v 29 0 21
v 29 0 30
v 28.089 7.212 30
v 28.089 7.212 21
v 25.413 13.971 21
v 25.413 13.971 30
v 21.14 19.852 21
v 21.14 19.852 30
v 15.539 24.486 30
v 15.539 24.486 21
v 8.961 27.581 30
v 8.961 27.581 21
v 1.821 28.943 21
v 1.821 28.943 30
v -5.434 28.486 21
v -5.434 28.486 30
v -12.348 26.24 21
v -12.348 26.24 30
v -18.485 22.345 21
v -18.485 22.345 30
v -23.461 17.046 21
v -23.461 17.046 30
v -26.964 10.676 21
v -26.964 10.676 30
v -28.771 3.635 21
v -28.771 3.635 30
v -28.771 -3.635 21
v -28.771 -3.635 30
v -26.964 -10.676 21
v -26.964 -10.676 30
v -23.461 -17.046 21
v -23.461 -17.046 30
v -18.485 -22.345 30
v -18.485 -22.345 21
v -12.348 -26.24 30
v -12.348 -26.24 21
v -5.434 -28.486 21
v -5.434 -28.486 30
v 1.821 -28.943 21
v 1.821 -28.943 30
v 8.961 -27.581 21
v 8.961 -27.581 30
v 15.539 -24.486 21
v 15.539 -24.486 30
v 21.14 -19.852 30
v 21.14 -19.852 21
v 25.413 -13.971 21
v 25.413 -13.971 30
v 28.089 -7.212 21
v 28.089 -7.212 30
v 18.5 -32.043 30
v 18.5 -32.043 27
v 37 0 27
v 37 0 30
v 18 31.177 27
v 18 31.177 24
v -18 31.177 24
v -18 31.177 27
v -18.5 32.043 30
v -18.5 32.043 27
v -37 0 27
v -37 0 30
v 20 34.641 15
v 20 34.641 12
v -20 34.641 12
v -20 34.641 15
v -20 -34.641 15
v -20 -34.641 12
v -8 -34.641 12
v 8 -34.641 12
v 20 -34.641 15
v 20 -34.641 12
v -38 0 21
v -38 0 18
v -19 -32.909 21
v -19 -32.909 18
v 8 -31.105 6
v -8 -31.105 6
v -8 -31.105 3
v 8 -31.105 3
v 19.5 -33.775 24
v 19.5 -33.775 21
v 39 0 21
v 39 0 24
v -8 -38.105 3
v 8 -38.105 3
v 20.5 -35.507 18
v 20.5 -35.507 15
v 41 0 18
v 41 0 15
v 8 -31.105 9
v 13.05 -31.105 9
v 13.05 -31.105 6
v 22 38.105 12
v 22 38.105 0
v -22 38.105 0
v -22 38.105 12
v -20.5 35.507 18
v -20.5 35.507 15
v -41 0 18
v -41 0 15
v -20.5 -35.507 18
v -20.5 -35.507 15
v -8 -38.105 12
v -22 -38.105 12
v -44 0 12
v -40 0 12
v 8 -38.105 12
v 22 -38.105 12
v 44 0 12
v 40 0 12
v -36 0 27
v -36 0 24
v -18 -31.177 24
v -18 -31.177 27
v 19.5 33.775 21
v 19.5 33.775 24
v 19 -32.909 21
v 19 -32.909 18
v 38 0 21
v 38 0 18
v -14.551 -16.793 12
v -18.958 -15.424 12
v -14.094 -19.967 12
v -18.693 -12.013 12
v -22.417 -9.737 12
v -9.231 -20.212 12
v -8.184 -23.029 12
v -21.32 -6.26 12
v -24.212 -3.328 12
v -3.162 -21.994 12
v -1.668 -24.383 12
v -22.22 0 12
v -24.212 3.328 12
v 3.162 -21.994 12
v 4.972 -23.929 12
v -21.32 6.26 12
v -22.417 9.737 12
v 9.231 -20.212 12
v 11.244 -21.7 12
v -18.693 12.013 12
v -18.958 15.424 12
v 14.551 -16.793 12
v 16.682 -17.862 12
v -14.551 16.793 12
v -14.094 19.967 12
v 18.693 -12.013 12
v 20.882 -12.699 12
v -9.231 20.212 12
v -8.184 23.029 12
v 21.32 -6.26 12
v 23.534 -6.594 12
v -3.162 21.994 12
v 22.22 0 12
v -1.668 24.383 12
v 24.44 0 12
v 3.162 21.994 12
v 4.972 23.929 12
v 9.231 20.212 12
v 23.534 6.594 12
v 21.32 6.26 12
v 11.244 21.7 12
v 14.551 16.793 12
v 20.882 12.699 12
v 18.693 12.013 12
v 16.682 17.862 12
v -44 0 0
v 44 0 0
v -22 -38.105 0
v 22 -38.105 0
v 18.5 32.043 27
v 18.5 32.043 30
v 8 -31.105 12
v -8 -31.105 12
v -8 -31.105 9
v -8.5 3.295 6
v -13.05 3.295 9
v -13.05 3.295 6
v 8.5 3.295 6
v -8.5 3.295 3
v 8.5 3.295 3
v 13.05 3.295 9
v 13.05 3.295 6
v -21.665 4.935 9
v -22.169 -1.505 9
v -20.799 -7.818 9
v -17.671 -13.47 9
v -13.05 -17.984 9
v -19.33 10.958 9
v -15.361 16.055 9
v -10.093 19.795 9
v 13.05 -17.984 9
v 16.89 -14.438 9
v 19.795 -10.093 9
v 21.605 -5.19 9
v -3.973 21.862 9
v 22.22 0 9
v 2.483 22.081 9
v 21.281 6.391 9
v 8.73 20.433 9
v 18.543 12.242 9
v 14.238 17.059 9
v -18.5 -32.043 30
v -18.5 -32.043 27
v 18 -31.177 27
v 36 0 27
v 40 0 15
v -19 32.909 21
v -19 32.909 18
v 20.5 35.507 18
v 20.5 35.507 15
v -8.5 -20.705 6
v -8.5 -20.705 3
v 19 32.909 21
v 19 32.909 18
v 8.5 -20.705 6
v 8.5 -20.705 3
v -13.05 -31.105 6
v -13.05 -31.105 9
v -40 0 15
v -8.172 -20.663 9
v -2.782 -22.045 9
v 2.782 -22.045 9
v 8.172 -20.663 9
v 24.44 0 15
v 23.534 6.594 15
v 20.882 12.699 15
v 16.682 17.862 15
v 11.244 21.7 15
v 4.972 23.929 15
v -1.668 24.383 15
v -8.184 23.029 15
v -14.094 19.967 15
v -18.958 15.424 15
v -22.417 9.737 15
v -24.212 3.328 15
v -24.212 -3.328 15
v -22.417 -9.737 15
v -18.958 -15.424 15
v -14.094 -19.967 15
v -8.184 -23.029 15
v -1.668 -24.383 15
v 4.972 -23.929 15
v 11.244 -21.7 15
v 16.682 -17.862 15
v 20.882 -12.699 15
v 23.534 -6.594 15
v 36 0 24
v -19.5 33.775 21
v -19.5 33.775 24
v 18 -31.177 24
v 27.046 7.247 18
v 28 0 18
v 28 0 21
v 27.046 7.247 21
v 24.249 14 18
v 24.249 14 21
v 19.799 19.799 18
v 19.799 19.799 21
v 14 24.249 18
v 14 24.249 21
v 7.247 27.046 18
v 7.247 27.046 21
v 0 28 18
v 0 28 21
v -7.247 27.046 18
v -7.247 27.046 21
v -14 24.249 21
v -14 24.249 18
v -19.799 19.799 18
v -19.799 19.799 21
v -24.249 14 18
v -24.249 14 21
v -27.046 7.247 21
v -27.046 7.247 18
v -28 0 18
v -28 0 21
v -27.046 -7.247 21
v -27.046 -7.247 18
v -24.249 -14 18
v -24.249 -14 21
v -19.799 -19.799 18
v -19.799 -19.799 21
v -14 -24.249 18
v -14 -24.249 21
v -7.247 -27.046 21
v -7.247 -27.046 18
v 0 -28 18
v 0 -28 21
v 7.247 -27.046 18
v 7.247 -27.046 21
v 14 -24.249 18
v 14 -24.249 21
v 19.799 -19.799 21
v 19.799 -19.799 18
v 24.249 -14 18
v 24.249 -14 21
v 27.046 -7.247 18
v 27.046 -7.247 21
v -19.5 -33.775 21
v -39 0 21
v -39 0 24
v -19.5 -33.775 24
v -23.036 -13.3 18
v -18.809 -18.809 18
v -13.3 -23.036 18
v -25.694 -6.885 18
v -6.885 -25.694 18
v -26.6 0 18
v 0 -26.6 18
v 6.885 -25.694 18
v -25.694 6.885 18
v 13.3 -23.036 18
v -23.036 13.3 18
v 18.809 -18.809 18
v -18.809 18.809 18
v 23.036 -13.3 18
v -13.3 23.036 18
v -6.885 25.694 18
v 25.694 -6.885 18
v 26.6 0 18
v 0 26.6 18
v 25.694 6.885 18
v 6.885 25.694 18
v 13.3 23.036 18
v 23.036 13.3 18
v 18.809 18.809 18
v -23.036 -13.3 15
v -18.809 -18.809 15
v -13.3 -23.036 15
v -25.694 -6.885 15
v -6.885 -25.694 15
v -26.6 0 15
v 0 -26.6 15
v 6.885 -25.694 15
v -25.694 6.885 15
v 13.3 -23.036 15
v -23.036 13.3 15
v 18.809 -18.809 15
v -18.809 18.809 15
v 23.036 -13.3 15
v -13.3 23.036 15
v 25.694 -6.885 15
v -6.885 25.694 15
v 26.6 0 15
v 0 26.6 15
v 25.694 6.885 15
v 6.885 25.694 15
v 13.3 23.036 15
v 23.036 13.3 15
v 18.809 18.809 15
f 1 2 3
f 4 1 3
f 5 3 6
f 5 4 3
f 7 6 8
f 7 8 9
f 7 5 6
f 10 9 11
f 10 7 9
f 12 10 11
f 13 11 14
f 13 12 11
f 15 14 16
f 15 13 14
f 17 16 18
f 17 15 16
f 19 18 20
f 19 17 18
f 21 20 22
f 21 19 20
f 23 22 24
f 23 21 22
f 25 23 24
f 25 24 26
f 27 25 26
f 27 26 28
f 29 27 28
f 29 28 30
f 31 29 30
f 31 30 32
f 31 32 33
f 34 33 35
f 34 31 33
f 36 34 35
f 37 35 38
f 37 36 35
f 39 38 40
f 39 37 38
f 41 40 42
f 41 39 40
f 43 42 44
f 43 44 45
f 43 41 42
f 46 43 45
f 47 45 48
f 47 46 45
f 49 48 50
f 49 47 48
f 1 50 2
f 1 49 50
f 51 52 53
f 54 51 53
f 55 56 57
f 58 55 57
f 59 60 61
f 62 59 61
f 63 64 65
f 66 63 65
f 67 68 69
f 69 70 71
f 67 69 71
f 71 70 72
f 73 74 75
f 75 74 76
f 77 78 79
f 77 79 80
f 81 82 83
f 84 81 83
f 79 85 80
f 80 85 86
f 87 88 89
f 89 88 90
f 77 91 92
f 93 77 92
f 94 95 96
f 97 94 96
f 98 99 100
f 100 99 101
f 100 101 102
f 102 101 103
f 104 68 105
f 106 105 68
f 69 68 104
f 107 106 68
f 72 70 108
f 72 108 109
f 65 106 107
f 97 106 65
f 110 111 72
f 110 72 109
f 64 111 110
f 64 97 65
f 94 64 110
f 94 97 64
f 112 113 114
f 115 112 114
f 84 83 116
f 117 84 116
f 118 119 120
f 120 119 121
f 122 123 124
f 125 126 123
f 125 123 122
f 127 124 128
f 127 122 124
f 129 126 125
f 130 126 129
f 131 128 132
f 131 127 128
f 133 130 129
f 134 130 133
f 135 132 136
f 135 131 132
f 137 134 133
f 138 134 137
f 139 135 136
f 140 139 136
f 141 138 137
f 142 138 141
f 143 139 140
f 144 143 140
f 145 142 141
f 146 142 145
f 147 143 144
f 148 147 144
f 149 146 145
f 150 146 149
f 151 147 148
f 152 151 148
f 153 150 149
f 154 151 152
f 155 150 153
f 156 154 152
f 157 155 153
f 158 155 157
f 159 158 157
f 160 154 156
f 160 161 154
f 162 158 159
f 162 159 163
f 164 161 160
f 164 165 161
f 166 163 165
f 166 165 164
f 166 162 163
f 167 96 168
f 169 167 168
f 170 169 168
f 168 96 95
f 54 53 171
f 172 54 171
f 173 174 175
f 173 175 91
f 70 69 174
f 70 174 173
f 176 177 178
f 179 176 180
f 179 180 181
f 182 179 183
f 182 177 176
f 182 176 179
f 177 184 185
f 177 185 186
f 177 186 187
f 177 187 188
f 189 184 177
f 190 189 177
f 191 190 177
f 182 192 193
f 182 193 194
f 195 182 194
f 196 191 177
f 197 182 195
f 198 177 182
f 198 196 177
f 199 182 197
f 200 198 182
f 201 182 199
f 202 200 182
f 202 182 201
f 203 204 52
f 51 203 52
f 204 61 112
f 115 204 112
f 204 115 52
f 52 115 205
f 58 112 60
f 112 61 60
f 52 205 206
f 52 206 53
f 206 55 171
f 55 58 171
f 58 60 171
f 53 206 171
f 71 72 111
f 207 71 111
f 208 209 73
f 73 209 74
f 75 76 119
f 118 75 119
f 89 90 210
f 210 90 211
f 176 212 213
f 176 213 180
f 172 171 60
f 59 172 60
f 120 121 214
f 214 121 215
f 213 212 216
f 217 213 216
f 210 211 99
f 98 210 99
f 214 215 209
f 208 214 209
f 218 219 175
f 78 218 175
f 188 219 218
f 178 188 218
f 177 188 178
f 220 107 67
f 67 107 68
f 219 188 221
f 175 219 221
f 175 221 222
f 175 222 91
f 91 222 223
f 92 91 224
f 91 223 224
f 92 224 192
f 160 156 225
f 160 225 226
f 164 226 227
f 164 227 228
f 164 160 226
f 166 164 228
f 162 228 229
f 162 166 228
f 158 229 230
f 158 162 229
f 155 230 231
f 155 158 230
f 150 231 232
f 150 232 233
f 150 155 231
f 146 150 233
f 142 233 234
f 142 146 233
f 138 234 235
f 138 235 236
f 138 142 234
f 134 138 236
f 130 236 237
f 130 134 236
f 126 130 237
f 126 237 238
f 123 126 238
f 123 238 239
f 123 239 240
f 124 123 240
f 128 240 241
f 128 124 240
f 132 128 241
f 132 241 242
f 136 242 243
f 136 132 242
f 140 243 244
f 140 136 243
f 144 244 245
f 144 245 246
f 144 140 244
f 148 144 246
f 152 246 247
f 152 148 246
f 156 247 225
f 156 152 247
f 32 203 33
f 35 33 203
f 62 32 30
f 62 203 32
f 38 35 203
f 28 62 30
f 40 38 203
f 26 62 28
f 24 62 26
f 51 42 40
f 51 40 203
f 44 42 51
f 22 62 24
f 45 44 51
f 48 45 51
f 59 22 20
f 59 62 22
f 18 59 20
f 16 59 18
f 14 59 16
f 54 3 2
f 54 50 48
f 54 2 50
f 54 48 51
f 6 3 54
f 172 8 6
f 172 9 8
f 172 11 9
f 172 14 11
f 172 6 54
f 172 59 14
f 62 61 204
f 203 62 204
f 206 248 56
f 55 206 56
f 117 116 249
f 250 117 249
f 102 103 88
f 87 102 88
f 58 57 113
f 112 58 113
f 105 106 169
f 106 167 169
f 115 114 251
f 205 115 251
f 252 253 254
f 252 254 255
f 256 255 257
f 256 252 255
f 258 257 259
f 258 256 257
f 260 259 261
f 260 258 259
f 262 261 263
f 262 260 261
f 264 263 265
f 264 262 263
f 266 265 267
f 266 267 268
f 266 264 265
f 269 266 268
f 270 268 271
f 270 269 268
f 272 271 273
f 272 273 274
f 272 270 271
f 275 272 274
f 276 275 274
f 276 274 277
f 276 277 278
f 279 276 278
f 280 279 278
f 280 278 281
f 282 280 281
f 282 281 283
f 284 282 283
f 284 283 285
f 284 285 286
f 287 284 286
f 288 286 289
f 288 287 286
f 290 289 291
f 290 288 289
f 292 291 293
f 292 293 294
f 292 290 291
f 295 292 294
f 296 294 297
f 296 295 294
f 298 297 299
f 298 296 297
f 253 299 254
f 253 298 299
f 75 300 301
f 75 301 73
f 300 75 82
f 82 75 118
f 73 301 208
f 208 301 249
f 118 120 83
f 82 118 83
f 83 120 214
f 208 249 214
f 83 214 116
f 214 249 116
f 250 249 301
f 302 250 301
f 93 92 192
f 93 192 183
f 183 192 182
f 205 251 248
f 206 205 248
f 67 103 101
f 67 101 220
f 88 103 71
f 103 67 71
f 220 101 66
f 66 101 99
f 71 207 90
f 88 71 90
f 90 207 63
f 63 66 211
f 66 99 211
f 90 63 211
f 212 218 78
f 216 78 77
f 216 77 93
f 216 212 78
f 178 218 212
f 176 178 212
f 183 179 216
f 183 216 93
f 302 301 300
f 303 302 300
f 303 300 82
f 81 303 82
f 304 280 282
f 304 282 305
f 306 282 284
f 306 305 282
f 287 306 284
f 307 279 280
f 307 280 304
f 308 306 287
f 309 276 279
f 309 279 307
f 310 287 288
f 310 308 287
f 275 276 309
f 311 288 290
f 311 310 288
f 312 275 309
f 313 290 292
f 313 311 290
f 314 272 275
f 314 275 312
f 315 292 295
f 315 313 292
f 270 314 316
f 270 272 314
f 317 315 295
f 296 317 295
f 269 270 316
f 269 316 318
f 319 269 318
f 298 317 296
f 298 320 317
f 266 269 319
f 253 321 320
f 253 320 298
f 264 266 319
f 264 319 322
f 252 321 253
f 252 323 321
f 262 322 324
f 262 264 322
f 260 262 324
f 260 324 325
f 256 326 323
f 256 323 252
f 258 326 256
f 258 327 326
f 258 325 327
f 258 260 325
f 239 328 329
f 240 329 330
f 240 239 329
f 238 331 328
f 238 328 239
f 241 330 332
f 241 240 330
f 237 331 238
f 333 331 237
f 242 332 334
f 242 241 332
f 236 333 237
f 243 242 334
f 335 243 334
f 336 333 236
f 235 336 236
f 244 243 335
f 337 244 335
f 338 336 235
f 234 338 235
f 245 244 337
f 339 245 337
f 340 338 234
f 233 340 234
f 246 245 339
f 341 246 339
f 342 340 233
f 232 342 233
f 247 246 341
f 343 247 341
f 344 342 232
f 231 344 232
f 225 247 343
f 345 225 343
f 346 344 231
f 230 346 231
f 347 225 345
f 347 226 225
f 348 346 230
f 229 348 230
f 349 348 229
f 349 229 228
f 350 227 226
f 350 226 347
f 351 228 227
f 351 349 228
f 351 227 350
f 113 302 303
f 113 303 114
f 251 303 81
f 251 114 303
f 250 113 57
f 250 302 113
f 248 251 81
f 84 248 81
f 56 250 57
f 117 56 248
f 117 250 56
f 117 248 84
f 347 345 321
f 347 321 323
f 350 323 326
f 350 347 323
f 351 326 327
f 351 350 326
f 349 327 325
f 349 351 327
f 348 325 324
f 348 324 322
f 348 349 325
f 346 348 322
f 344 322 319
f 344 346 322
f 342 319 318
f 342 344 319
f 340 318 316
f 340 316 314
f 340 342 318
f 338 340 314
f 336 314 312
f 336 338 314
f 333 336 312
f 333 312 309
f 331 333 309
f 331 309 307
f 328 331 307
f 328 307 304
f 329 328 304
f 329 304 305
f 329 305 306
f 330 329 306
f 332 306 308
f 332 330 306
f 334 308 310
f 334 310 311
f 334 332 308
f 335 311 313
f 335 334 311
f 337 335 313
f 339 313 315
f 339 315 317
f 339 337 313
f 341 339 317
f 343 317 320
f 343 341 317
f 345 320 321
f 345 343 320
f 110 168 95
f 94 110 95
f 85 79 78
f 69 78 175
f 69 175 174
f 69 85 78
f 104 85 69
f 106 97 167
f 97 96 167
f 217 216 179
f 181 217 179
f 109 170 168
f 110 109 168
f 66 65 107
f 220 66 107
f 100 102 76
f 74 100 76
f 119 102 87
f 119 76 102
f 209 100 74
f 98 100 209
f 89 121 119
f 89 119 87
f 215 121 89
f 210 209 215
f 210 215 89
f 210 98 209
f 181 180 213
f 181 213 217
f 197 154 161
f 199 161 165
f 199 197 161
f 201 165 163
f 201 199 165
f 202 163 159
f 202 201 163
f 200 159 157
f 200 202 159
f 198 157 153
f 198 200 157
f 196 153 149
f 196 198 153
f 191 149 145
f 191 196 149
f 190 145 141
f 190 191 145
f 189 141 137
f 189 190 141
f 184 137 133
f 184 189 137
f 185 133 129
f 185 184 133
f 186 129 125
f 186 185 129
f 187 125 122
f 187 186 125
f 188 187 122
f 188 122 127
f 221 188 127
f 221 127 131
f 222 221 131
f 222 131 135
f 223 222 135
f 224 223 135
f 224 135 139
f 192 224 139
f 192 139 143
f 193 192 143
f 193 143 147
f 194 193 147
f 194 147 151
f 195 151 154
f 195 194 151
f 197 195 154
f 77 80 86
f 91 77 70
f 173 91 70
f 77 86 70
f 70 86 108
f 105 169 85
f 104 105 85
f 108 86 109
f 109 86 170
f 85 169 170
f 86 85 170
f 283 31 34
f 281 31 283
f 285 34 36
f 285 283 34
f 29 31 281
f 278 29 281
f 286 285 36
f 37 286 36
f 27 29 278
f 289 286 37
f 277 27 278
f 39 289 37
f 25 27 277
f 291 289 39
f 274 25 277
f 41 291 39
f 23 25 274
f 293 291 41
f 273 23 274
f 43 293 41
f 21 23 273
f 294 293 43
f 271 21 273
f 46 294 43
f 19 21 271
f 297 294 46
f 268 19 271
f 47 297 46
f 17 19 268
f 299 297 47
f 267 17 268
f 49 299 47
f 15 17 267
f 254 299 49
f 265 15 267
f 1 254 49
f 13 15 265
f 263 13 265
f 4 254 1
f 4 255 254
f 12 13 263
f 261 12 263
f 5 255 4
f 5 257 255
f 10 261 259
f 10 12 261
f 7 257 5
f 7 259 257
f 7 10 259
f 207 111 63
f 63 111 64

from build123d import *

# Parameters (mm, degrees)
PAD_DEPTH       = 9
SKETCH001_W     = 26.1
SKETCH001_H     = 34.4
POCKET_DEPTH    = 3
SKETCH002_R     = 22.22
PAD001_DEPTH    = 3
SKETCH003_R     = 24.44
PAD002_DEPTH    = 3
SKETCH004_R     = 26.6
PAD003_DEPTH    = 3
SKETCH005_R     = 28
PAD004_DEPTH    = 3
SKETCH006_R     = 29
PAD005_DEPTH    = 3
SKETCH007_R     = 29
PAD006_DEPTH    = 3
SKETCH008_R     = 29
PAD007_DEPTH    = 3
SKETCH009_W     = 17
SKETCH009_H     = 24
POCKET001_DEPTH = 3
SKETCH010_W     = 16
SKETCH010_H     = 9
POCKET002_DEPTH = 7


with BuildPart() as part:
    # Sketch → Pad (new body)
    with BuildSketch(Plane.XY):
        Polygon((44, 0), (22, 38.105118), (-22, 38.105118), (-44, 0), (-22, -38.105118), (22, -38.105118), align=None)
    extrude(amount=PAD_DEPTH)

    # Sketch001 (on Face8 of Pad) → Pocket (cut)
    with BuildSketch(Plane.XY.offset(9)):
        with Locations((0, -13.905118)):
            Rectangle(SKETCH001_W, SKETCH001_H)
    extrude(amount=-POCKET_DEPTH, mode=Mode.SUBTRACT)

    # Sketch002 (on Face5 of Pocket) → Pad001 (join)
    with BuildSketch(Plane.XY.offset(9)):
        Polygon((22, 38.105118), (-22, 38.105118), (-44, 0), (-22, -38.105118), (22, -38.105118), (44, 0), align=None)
        Circle(SKETCH002_R, mode=Mode.SUBTRACT)
    extrude(amount=PAD001_DEPTH)

    # Sketch003 (on Face14 of Pad001) → Pad002 (join)
    with BuildSketch(Plane.XY.offset(12)):
        Polygon((40, 0), (20, 34.641016), (-20, 34.641016), (-40, 0), (-20, -34.641016), (20, -34.641016), align=None)
        Circle(SKETCH003_R, mode=Mode.SUBTRACT)
    extrude(amount=PAD002_DEPTH)

    # Sketch004 (on Face21 of Pad002) → Pad003 (join)
    with BuildSketch(Plane.XY.offset(15)):
        Polygon((41, 0), (20.5, 35.507042), (-20.5, 35.507042), (-41, 0), (-20.5, -35.507042), (20.5, -35.507042), align=None)
        Circle(SKETCH004_R, mode=Mode.SUBTRACT)
    extrude(amount=PAD003_DEPTH)

    # Sketch005 (on Face28 of Pad003) → Pad004 (join)
    with BuildSketch(Plane.XY.offset(18)):
        Polygon((19, 32.908965), (-19, 32.908965), (-38, 0), (-19, -32.908965), (19, -32.908965), (38, 0), align=None)
        Circle(SKETCH005_R, mode=Mode.SUBTRACT)
    extrude(amount=PAD004_DEPTH)

    # Sketch006 (on Face35 of Pad004) → Pad005 (join)
    with BuildSketch(Plane.XY.offset(21)):
        Polygon((39, 0), (19.5, 33.774991), (-19.5, 33.774991), (-39, 0), (-19.5, -33.774991), (19.5, -33.774991), align=None)
        Circle(SKETCH006_R, mode=Mode.SUBTRACT)
    extrude(amount=PAD005_DEPTH)

    # Sketch007 (on Face42 of Pad005) → Pad006 (join)
    with BuildSketch(Plane.XY.offset(24)):
        Polygon((36, 0), (18, 31.176915), (-18, 31.176915), (-36, 0), (-18, -31.176915), (18, -31.176915), align=None)
        Circle(SKETCH007_R, mode=Mode.SUBTRACT)
    extrude(amount=PAD006_DEPTH)

    # Sketch008 (on Face49 of Pad006) → Pad007 (join)
    with BuildSketch(Plane.XY.offset(27)):
        Polygon((37, 0), (18.5, 32.04294), (-18.5, 32.04294), (-37, 0), (-18.5, -32.04294), (18.5, -32.04294), align=None)
        Circle(SKETCH008_R, mode=Mode.SUBTRACT)
    extrude(amount=PAD007_DEPTH)

    # Sketch009 (on Face74 of Pad007) → Pocket001 (cut)
    with BuildSketch(Plane.XY.offset(6)):
        with Locations((0, -8.705118)):
            Rectangle(SKETCH009_W, SKETCH009_H)
    extrude(amount=-POCKET001_DEPTH, mode=Mode.SUBTRACT)

    # Sketch010 (on Face12 of Pocket001) → Pocket002 (cut)
    with BuildSketch(Plane.XZ.offset(38.105118)):
        with Locations((0, 7.5)):
            Rectangle(SKETCH010_W, SKETCH010_H)
    extrude(amount=-POCKET002_DEPTH, mode=Mode.SUBTRACT)


solid = part.part
